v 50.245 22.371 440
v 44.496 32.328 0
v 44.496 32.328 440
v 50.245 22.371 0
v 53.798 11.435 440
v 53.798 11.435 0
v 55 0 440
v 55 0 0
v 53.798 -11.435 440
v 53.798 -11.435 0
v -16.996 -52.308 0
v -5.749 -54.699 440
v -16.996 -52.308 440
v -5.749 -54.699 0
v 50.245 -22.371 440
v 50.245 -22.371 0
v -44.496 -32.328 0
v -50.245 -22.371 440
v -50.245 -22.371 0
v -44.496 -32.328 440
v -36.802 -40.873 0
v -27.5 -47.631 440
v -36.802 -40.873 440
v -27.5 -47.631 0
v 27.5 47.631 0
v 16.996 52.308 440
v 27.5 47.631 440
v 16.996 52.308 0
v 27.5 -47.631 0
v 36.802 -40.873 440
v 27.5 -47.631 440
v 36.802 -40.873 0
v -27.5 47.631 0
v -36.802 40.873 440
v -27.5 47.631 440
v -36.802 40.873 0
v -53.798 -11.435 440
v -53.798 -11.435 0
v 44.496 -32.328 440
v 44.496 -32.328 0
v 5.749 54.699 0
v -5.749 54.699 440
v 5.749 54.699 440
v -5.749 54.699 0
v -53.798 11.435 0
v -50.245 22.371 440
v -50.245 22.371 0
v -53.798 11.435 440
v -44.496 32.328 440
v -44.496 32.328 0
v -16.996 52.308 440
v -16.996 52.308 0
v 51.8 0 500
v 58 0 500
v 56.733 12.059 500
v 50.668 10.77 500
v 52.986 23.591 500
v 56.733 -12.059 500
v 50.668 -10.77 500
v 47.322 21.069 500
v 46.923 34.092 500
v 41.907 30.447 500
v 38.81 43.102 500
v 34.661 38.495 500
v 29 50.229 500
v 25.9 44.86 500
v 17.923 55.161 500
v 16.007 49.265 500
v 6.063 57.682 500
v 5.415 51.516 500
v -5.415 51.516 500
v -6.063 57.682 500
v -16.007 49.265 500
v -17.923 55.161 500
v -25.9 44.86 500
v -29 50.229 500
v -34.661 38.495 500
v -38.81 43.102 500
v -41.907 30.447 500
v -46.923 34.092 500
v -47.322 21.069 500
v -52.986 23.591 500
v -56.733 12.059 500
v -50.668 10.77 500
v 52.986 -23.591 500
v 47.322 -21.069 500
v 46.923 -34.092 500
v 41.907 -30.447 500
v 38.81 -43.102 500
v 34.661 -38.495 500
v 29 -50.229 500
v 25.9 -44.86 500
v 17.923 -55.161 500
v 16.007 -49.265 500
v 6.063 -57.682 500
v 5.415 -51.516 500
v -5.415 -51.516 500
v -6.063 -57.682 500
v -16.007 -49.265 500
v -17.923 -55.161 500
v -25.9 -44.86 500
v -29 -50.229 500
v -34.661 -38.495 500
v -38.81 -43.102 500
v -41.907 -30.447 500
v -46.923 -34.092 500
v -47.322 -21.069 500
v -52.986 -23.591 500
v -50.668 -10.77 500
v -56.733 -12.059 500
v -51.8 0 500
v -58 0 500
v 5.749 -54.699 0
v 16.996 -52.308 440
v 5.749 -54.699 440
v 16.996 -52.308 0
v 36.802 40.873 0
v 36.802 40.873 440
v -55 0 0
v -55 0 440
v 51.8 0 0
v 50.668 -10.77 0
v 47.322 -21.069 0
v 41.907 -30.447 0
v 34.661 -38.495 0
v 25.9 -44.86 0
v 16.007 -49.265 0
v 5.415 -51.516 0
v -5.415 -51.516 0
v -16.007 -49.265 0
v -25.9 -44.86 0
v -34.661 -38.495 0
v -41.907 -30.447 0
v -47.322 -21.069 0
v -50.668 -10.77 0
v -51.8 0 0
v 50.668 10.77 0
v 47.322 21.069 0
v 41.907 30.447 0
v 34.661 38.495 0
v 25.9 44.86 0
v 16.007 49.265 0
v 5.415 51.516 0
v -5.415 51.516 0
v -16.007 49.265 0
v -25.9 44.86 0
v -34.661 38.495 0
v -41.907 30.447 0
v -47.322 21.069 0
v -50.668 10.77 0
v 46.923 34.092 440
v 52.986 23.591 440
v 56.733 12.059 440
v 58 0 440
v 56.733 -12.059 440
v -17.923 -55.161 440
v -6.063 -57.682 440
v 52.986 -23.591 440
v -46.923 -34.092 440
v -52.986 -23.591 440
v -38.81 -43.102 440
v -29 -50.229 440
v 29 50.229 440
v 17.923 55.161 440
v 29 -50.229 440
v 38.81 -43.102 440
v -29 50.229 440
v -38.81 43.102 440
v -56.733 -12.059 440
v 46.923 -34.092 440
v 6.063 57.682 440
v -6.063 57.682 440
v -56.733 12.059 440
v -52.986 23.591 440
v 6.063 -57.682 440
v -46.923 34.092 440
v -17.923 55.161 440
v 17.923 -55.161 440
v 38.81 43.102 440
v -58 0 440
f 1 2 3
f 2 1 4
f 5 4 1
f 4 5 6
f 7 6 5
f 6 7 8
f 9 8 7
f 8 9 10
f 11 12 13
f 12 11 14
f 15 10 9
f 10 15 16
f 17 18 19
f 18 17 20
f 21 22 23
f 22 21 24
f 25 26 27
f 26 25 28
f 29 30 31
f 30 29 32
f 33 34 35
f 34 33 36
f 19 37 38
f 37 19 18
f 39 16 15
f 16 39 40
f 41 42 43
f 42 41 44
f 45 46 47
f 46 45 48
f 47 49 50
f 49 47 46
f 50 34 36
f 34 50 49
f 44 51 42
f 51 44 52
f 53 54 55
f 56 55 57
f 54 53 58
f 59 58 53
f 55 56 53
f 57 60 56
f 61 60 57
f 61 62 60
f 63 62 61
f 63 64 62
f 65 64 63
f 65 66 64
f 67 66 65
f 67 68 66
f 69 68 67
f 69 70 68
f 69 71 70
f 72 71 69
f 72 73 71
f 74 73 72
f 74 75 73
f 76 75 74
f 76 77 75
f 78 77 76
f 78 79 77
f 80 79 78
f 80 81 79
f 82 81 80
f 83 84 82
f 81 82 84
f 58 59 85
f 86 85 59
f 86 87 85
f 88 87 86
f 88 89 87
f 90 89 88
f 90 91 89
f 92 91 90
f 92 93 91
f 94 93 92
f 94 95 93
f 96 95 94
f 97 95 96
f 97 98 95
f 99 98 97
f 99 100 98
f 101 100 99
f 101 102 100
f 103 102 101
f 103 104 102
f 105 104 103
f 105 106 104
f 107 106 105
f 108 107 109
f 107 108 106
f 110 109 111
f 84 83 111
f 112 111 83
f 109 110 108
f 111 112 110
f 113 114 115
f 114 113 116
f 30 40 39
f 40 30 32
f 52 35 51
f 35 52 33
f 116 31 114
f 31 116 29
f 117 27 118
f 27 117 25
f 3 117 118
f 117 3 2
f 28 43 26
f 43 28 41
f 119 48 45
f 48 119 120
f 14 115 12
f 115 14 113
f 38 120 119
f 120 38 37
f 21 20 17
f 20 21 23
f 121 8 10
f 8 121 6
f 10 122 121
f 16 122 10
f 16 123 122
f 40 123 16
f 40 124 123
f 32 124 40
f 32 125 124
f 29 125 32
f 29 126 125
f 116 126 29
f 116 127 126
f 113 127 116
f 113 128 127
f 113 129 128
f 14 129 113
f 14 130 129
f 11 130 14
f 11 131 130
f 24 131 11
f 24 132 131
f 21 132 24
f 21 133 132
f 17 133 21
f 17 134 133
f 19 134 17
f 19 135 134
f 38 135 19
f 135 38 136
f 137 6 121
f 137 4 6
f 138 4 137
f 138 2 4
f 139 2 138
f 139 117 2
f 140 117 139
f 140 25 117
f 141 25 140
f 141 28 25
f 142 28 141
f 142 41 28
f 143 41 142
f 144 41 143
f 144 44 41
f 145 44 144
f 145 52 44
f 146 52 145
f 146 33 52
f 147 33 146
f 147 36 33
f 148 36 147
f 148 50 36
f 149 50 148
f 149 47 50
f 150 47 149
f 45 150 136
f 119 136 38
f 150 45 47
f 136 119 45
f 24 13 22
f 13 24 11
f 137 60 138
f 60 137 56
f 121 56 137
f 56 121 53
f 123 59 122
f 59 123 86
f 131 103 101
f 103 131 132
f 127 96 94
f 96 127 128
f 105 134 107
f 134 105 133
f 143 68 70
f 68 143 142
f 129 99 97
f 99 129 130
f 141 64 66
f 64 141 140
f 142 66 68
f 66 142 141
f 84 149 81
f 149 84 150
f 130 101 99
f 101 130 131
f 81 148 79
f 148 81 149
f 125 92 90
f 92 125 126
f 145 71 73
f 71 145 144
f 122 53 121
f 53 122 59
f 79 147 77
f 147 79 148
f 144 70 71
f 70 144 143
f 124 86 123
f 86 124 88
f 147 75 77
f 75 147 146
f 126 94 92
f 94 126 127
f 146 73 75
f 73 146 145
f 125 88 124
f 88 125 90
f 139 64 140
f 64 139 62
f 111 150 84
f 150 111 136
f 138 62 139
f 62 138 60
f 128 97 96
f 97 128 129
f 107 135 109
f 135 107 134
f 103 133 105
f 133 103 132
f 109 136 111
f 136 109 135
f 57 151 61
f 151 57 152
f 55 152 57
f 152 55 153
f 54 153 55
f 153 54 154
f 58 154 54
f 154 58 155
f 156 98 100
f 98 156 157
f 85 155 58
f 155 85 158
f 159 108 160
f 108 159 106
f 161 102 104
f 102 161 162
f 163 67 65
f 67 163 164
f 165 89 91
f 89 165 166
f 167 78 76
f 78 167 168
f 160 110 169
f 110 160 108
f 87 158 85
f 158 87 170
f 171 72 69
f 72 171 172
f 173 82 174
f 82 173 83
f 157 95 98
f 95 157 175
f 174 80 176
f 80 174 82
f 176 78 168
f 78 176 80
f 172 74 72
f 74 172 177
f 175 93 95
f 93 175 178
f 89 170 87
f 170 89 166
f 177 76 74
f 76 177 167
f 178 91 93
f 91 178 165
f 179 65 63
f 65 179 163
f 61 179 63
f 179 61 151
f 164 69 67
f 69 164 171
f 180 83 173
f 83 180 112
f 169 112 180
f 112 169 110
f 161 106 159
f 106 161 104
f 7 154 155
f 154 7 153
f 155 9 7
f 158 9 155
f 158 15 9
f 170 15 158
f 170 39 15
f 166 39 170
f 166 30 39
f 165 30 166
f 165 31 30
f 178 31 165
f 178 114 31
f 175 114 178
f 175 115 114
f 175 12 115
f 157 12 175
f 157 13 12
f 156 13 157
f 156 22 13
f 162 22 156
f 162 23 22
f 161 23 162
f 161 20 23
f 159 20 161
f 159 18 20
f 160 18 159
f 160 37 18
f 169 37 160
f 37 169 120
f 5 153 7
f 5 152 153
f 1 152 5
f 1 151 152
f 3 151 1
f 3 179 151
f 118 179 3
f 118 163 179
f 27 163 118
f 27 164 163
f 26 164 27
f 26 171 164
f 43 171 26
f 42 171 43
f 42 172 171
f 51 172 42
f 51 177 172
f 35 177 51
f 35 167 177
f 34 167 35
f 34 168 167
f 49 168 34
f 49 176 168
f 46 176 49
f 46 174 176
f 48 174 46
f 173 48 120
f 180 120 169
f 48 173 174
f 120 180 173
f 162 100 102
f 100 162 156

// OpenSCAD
// Parameters
pipe_standard = 0; //[0:1:1]
nominal_diameter = 110; //[55:220:1]
length_mm = 500; //[250:1000:1]
pipe_od = 110; //[90:160:1]
pipe_wall = 3.2; //[2:6.5:0.1]
socket_od_extra = 6; //[3:12:0.5]
socket_length = 60; //[30:120:1]
socket_wall_extra = 1.5; //[0.5:4:0.1]
overlap = 1; //[0.5:2:0.1]

// Module for the HT Pipe
module ht_pipe() {
  color([0.85, 0.85, 0.8]) { // PVC color
    // Hollow tube body
    difference() {
      cylinder(h=length_mm, r=pipe_od/2, center=false);
      translate([0, 0, -overlap/2])
        cylinder(h=length_mm + overlap, r=pipe_od/2 - pipe_wall, center=false);
    }
    
    // End fitting
    translate([0, 0, length_mm - socket_length]) {
      difference() {
        cylinder(h=socket_length, r=pipe_od/2 + socket_od_extra/2, center=false);
        translate([0, 0, -overlap/2])
          cylinder(h=socket_length + overlap, r=pipe_od/2 - pipe_wall + socket_wall_extra, center=false);
      }
    }
  }
}

// Assembly
module assembly() {
  ht_pipe();
}

assembly();
